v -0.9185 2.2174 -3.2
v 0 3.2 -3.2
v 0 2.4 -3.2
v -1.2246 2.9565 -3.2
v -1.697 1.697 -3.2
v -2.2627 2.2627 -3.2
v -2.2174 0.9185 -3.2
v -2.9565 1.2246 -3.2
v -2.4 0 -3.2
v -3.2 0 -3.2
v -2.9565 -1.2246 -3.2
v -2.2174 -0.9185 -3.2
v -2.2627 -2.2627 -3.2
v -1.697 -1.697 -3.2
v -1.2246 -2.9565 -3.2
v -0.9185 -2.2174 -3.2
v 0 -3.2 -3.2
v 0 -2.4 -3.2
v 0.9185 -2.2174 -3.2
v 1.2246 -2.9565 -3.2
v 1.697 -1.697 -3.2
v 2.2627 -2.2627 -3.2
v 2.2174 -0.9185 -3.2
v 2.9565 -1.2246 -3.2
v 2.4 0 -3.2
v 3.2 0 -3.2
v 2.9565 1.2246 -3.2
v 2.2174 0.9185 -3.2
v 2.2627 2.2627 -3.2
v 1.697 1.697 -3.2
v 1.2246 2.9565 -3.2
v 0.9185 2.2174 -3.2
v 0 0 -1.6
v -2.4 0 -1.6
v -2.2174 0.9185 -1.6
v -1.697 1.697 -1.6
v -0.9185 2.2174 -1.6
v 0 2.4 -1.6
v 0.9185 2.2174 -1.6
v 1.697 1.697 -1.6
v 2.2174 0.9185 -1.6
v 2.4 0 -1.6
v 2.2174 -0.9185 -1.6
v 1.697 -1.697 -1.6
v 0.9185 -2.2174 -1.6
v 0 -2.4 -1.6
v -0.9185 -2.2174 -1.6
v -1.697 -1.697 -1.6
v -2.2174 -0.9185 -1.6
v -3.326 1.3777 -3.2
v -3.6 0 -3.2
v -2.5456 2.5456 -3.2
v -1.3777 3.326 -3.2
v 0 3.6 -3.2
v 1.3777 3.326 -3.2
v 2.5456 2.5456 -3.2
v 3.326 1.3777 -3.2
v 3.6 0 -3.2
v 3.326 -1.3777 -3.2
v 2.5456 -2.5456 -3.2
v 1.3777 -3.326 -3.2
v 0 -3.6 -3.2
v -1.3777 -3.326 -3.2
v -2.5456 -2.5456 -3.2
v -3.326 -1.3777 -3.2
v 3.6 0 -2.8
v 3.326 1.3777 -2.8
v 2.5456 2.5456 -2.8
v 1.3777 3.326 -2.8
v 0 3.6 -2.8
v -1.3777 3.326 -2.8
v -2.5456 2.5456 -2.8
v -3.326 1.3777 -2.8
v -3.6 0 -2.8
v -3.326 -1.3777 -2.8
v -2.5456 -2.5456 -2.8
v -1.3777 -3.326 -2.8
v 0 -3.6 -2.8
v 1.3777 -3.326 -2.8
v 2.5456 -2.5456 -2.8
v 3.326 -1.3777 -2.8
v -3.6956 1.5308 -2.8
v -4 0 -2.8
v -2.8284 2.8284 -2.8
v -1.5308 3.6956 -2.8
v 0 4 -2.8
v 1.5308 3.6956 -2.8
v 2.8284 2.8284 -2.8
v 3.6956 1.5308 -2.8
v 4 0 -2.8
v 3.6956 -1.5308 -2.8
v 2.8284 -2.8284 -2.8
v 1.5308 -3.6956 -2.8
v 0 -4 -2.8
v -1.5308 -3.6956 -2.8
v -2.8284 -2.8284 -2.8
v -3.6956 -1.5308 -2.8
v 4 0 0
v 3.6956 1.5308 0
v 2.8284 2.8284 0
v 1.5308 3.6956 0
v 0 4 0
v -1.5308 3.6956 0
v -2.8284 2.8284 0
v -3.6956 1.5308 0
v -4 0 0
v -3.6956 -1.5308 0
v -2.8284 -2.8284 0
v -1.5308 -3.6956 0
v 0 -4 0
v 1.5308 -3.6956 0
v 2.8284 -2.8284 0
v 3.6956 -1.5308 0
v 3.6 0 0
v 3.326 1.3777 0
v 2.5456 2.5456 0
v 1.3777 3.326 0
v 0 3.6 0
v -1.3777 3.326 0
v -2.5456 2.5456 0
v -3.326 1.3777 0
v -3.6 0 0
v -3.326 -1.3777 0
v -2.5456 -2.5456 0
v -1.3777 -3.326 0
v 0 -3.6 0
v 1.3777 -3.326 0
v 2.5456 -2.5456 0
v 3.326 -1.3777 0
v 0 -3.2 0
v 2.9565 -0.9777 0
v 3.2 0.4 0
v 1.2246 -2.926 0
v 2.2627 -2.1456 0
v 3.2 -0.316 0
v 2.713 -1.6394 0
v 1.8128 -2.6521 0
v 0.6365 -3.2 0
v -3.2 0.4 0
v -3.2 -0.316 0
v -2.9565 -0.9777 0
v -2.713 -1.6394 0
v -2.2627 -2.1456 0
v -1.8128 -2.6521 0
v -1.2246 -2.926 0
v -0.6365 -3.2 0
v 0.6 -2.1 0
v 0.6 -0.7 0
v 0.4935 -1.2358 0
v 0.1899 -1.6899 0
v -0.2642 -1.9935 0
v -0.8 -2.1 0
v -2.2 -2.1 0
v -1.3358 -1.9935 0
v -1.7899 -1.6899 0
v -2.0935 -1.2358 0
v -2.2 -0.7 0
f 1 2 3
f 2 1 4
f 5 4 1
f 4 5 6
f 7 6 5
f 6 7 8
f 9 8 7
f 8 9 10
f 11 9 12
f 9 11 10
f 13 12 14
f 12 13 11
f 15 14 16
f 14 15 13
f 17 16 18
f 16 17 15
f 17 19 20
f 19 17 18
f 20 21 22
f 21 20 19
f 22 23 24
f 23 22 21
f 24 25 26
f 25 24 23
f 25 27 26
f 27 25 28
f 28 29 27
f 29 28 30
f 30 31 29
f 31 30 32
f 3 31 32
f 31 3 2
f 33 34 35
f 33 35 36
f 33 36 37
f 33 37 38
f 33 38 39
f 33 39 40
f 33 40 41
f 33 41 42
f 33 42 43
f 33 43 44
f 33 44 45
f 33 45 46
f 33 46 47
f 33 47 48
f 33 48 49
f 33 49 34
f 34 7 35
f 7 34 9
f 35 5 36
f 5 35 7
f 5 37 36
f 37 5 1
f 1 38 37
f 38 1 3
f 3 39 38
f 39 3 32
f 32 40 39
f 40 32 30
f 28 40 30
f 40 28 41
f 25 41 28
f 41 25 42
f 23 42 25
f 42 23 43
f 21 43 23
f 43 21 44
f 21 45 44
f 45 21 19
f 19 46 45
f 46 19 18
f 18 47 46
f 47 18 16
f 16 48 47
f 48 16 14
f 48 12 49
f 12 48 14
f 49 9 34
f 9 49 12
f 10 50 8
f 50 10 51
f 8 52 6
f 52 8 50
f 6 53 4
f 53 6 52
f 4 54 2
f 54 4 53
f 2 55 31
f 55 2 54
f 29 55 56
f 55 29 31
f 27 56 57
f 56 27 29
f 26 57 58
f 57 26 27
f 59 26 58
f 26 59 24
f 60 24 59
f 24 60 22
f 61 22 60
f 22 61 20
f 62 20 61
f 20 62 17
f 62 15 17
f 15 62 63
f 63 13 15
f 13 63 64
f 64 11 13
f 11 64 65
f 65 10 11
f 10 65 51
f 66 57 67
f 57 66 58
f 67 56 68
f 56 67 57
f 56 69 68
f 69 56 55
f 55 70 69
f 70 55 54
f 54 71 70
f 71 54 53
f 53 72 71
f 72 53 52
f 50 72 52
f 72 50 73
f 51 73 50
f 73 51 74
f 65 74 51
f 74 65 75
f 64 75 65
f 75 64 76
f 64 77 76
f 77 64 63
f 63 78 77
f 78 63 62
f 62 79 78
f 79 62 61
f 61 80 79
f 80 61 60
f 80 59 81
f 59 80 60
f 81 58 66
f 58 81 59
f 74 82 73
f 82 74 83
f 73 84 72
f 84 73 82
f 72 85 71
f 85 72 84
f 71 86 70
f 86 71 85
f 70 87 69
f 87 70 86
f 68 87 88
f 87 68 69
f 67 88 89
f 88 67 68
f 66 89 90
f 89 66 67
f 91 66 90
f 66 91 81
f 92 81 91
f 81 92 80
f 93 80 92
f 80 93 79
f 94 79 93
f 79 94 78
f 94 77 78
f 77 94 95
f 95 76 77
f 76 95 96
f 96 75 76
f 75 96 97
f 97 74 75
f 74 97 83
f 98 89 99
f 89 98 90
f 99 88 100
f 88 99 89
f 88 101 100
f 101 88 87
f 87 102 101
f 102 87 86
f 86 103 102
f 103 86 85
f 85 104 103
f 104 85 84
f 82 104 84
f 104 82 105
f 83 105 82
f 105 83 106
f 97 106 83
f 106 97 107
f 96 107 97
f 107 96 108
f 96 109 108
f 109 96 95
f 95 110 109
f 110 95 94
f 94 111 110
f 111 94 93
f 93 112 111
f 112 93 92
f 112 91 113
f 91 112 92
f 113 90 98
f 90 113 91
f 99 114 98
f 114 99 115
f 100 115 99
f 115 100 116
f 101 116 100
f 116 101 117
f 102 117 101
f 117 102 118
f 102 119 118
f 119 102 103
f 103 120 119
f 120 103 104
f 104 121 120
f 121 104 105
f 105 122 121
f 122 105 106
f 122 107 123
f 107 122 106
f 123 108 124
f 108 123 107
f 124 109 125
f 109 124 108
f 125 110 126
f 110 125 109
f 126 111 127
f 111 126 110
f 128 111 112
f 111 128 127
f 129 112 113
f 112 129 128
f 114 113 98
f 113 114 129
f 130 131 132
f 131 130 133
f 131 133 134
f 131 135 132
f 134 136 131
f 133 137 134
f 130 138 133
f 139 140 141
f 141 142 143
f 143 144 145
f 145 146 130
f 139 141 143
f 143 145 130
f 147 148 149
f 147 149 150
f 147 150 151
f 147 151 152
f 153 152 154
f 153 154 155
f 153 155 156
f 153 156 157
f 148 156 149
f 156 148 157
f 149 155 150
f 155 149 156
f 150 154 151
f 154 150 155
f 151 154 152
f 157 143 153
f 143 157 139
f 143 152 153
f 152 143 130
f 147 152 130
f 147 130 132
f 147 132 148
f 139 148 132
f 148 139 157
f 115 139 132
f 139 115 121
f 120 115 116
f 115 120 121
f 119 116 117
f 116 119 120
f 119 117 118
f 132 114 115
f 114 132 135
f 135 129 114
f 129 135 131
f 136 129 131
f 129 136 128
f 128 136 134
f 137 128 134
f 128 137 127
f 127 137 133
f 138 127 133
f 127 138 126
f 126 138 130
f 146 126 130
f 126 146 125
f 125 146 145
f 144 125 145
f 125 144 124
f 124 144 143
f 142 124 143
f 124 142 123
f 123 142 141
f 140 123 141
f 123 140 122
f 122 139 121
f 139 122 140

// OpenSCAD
use <../lib.scad>
use <../p/1-4chrd.scad>
use <../p/1-4tang.scad>
use <../p/1-8chrd.scad>
use <../p/2-4chrd.scad>
use <../p/2-4ndis.scad>
use <../p/4-4ering.scad>
use <s/98138s01.scad>
function ldraw_lib__98138p2l() = [
// 0 Tile  1 x  1 Round with Half Circle Within a Black Half Circle Pattern
// 0 Name: 98138p2l.dat
// 0 Author: Vincent Messenet [Cheenzo]
// 0 !LDRAW_ORG Part UPDATE 2023-06
// 0 !LICENSE Licensed under CC BY 4.0 : see CAreadme.txt
// 
// 0 BFC CERTIFY CCW
  [0,"BFC","CERTIFY"],
  [0,"BFC","CCW"],
// 
// 0 !KEYWORDS Bricklink 98138pb366, BrickOwl 679274, Eye, Rebrickable 98138pr9976
// 0 !KEYWORDS Set 11027, Set 11028, Set 11031, Set 11033
// 
// 0 !HISTORY 2023-11-19 [OrionP] Official Update 2023-06
// 
// 
// 1 16 0 0 0 1 0 0 0 1 0 0 0 1 s\98138s01.dat
  [1,16,0,0,0,1,0,0,0,1,0,0,0,1, ldraw_lib__s__98138s01()],
// 1 16 0 0 0 9 0 0 0 1 0 0 0 9 4-4ering.dat
  [1,16,0,0,0,9,0,0,0,1,0,0,0,9, ldraw_lib__4_4ering()],
// 1 0 0 0 1 8 0 0 0 1 0 0 0 -9 1-4chrd.dat
  [1,0,0,0,1,8,0,0,0,1,0,0,0,-9, ldraw_lib__1_4chrd()],
// 1 16 0 0 1 8 0 0 0 1 0 0 0 -9 1-4tang.dat
  [1,16,0,0,1,8,0,0,0,1,0,0,0,-9, ldraw_lib__1_4tang()],
// 1 16 0 0 1 -8 0 0 0 1 0 0 0 -9 1-4tang.dat
  [1,16,0,0,1,-8,0,0,0,1,0,0,0,-9, ldraw_lib__1_4tang()],
// 1 0 0 0 1 -8 0 0 0 1 0 0 0 -9 1-8chrd.dat
  [1,0,0,0,1,-8,0,0,0,1,0,0,0,-9, ldraw_lib__1_8chrd()],
// 1 0 0 0 1 0 0 -8 0 1 0 -9 0 0 1-8chrd.dat
  [1,0,0,0,1,0,0,-8,0,1,0,-9,0,0, ldraw_lib__1_8chrd()],
// 1 0 -2 0 -1.75 3.5 0 0 0 1 0 0 0 -3.5 2-4ndis.dat
  [1,0,-2,0,-1.75,3.5,0,0,0,1,0,0,0,-3.5, ldraw_lib__2_4ndis()],
// 1 16 -2 0 -1.75 3.5 0 0 0 1 0 0 0 -3.5 2-4chrd.dat
  [1,16,-2,0,-1.75,3.5,0,0,0,1,0,0,0,-3.5, ldraw_lib__2_4chrd()],
// 4 0 -5.5 0 -5.25 -5.5 0 -1.75 -8 0 1 -5.6568 0 -5.3639
  [4,0,-5.5,0,-5.25,-5.5,0,-1.75,-8,0,1,-5.6568,0,-5.3639],
// 4 0 -2 0 -5.25 -5.5 0 -5.25 -5.6568 0 -5.3639 0 0 -8
  [4,0,-2,0,-5.25,-5.5,0,-5.25,-5.6568,0,-5.3639,0,0,-8],
// 3 0 1.5 0 -5.25 -2 0 -5.25 0 0 -8
  [3,0,1.5,0,-5.25,-2,0,-5.25,0,0,-8],
// 3 0 1.5 0 -5.25 0 0 -8 8 0 1
  [3,0,1.5,0,-5.25,0,0,-8,8,0,1],
// 3 0 1.5 0 -5.25 8 0 1 1.5 0 -1.75
  [3,0,1.5,0,-5.25,8,0,1,1.5,0,-1.75],
// 4 0 -8 0 1 -5.5 0 -1.75 1.5 0 -1.75 8 0 1
  [4,0,-8,0,1,-5.5,0,-1.75,1.5,0,-1.75,8,0,1],
// 4 16 8.3151 0 3.4443 -8.3151 0 3.4443 -8 0 1 8 0 1
  [4,16,8.3151,0,3.4443,-8.3151,0,3.4443,-8,0,1,8,0,1],
// 4 16 -8.3151 0 3.4443 8.3151 0 3.4443 6.3639 0 6.3639 -6.3639 0 6.3639
  [4,16,-8.3151,0,3.4443,8.3151,0,3.4443,6.3639,0,6.3639,-6.3639,0,6.3639],
// 4 16 -3.4443 0 8.3151 -6.3639 0 6.3639 6.3639 0 6.3639 3.4443 0 8.3151
  [4,16,-3.4443,0,8.3151,-6.3639,0,6.3639,6.3639,0,6.3639,3.4443,0,8.3151],
// 3 16 -3.4443 0 8.3151 3.4443 0 8.3151 0 0 9
  [3,16,-3.4443,0,8.3151,3.4443,0,8.3151,0,0,9],
// 4 16 8.3151 0 3.4443 8 0 1 8 0 -.7901 9 0 0
  [4,16,8.3151,0,3.4443,8,0,1,8,0,-.7901,9,0,0],
// 4 16 9 0 0 8 0 -.7901 7.3912 0 -2.4443 8.3151 0 -3.4443
  [4,16,9,0,0,8,0,-.7901,7.3912,0,-2.4443,8.3151,0,-3.4443],
// 4 16 7.3912 0 -2.4443 6.7824 0 -4.0985 6.3639 0 -6.3639 8.3151 0 -3.4443
  [4,16,7.3912,0,-2.4443,6.7824,0,-4.0985,6.3639,0,-6.3639,8.3151,0,-3.4443],
// 3 16 6.3639 0 -6.3639 6.7824 0 -4.0985 5.6568 0 -5.3639
  [3,16,6.3639,0,-6.3639,6.7824,0,-4.0985,5.6568,0,-5.3639],
// 4 16 3.4443 0 -8.3151 6.3639 0 -6.3639 5.6568 0 -5.3639 4.532 0 -6.6302
  [4,16,3.4443,0,-8.3151,6.3639,0,-6.3639,5.6568,0,-5.3639,4.532,0,-6.6302],
// 3 16 3.4443 0 -8.3151 4.532 0 -6.6302 3.0616 0 -7.3151
  [3,16,3.4443,0,-8.3151,4.532,0,-6.6302,3.0616,0,-7.3151],
// 4 16 3.0616 0 -7.3151 1.5912 0 -8 0 0 -9 3.4443 0 -8.3151
  [4,16,3.0616,0,-7.3151,1.5912,0,-8,0,0,-9,3.4443,0,-8.3151],
// 3 16 0 0 -9 1.5912 0 -8 0 0 -8
  [3,16,0,0,-9,1.5912,0,-8,0,0,-8],
// 4 16 -3.4443 0 -8.3151 0 0 -9 0 0 -8 -1.5912 0 -8
  [4,16,-3.4443,0,-8.3151,0,0,-9,0,0,-8,-1.5912,0,-8],
// 3 16 -3.4443 0 -8.3151 -1.5912 0 -8 -3.0616 0 -7.3151
  [3,16,-3.4443,0,-8.3151,-1.5912,0,-8,-3.0616,0,-7.3151],
// 4 16 -3.0616 0 -7.3151 -4.532 0 -6.6302 -6.3639 0 -6.3639 -3.4443 0 -8.3151
  [4,16,-3.0616,0,-7.3151,-4.532,0,-6.6302,-6.3639,0,-6.3639,-3.4443,0,-8.3151],
// 3 16 -6.3639 0 -6.3639 -4.532 0 -6.6302 -5.6568 0 -5.3639
  [3,16,-6.3639,0,-6.3639,-4.532,0,-6.6302,-5.6568,0,-5.3639],
// 4 16 -8.3151 0 -3.4443 -6.3639 0 -6.3639 -5.6568 0 -5.3639 -6.7824 0 -4.0985
  [4,16,-8.3151,0,-3.4443,-6.3639,0,-6.3639,-5.6568,0,-5.3639,-6.7824,0,-4.0985],
// 3 16 -8.3151 0 -3.4443 -6.7824 0 -4.0985 -7.3912 0 -2.4443
  [3,16,-8.3151,0,-3.4443,-6.7824,0,-4.0985,-7.3912,0,-2.4443],
// 4 16 -9 0 0 -8.3151 0 -3.4443 -7.3912 0 -2.4443 -8 0 -.7901
  [4,16,-9,0,0,-8.3151,0,-3.4443,-7.3912,0,-2.4443,-8,0,-.7901],
// 4 16 -8.3151 0 3.4443 -9 0 0 -8 0 -.7901 -8 0 1
  [4,16,-8.3151,0,3.4443,-9,0,0,-8,0,-.7901,-8,0,1],
];
module ldraw_lib__98138p2l(step=0, col=false, unit=2/5, alt=false, line=0.2, solid=!$preview)
    makepoly(ldraw_lib__98138p2l(), step=step, col=col, unit=unit, alt=alt, line=line, solid=solid);
ldraw_lib__98138p2l(line=0.2);
